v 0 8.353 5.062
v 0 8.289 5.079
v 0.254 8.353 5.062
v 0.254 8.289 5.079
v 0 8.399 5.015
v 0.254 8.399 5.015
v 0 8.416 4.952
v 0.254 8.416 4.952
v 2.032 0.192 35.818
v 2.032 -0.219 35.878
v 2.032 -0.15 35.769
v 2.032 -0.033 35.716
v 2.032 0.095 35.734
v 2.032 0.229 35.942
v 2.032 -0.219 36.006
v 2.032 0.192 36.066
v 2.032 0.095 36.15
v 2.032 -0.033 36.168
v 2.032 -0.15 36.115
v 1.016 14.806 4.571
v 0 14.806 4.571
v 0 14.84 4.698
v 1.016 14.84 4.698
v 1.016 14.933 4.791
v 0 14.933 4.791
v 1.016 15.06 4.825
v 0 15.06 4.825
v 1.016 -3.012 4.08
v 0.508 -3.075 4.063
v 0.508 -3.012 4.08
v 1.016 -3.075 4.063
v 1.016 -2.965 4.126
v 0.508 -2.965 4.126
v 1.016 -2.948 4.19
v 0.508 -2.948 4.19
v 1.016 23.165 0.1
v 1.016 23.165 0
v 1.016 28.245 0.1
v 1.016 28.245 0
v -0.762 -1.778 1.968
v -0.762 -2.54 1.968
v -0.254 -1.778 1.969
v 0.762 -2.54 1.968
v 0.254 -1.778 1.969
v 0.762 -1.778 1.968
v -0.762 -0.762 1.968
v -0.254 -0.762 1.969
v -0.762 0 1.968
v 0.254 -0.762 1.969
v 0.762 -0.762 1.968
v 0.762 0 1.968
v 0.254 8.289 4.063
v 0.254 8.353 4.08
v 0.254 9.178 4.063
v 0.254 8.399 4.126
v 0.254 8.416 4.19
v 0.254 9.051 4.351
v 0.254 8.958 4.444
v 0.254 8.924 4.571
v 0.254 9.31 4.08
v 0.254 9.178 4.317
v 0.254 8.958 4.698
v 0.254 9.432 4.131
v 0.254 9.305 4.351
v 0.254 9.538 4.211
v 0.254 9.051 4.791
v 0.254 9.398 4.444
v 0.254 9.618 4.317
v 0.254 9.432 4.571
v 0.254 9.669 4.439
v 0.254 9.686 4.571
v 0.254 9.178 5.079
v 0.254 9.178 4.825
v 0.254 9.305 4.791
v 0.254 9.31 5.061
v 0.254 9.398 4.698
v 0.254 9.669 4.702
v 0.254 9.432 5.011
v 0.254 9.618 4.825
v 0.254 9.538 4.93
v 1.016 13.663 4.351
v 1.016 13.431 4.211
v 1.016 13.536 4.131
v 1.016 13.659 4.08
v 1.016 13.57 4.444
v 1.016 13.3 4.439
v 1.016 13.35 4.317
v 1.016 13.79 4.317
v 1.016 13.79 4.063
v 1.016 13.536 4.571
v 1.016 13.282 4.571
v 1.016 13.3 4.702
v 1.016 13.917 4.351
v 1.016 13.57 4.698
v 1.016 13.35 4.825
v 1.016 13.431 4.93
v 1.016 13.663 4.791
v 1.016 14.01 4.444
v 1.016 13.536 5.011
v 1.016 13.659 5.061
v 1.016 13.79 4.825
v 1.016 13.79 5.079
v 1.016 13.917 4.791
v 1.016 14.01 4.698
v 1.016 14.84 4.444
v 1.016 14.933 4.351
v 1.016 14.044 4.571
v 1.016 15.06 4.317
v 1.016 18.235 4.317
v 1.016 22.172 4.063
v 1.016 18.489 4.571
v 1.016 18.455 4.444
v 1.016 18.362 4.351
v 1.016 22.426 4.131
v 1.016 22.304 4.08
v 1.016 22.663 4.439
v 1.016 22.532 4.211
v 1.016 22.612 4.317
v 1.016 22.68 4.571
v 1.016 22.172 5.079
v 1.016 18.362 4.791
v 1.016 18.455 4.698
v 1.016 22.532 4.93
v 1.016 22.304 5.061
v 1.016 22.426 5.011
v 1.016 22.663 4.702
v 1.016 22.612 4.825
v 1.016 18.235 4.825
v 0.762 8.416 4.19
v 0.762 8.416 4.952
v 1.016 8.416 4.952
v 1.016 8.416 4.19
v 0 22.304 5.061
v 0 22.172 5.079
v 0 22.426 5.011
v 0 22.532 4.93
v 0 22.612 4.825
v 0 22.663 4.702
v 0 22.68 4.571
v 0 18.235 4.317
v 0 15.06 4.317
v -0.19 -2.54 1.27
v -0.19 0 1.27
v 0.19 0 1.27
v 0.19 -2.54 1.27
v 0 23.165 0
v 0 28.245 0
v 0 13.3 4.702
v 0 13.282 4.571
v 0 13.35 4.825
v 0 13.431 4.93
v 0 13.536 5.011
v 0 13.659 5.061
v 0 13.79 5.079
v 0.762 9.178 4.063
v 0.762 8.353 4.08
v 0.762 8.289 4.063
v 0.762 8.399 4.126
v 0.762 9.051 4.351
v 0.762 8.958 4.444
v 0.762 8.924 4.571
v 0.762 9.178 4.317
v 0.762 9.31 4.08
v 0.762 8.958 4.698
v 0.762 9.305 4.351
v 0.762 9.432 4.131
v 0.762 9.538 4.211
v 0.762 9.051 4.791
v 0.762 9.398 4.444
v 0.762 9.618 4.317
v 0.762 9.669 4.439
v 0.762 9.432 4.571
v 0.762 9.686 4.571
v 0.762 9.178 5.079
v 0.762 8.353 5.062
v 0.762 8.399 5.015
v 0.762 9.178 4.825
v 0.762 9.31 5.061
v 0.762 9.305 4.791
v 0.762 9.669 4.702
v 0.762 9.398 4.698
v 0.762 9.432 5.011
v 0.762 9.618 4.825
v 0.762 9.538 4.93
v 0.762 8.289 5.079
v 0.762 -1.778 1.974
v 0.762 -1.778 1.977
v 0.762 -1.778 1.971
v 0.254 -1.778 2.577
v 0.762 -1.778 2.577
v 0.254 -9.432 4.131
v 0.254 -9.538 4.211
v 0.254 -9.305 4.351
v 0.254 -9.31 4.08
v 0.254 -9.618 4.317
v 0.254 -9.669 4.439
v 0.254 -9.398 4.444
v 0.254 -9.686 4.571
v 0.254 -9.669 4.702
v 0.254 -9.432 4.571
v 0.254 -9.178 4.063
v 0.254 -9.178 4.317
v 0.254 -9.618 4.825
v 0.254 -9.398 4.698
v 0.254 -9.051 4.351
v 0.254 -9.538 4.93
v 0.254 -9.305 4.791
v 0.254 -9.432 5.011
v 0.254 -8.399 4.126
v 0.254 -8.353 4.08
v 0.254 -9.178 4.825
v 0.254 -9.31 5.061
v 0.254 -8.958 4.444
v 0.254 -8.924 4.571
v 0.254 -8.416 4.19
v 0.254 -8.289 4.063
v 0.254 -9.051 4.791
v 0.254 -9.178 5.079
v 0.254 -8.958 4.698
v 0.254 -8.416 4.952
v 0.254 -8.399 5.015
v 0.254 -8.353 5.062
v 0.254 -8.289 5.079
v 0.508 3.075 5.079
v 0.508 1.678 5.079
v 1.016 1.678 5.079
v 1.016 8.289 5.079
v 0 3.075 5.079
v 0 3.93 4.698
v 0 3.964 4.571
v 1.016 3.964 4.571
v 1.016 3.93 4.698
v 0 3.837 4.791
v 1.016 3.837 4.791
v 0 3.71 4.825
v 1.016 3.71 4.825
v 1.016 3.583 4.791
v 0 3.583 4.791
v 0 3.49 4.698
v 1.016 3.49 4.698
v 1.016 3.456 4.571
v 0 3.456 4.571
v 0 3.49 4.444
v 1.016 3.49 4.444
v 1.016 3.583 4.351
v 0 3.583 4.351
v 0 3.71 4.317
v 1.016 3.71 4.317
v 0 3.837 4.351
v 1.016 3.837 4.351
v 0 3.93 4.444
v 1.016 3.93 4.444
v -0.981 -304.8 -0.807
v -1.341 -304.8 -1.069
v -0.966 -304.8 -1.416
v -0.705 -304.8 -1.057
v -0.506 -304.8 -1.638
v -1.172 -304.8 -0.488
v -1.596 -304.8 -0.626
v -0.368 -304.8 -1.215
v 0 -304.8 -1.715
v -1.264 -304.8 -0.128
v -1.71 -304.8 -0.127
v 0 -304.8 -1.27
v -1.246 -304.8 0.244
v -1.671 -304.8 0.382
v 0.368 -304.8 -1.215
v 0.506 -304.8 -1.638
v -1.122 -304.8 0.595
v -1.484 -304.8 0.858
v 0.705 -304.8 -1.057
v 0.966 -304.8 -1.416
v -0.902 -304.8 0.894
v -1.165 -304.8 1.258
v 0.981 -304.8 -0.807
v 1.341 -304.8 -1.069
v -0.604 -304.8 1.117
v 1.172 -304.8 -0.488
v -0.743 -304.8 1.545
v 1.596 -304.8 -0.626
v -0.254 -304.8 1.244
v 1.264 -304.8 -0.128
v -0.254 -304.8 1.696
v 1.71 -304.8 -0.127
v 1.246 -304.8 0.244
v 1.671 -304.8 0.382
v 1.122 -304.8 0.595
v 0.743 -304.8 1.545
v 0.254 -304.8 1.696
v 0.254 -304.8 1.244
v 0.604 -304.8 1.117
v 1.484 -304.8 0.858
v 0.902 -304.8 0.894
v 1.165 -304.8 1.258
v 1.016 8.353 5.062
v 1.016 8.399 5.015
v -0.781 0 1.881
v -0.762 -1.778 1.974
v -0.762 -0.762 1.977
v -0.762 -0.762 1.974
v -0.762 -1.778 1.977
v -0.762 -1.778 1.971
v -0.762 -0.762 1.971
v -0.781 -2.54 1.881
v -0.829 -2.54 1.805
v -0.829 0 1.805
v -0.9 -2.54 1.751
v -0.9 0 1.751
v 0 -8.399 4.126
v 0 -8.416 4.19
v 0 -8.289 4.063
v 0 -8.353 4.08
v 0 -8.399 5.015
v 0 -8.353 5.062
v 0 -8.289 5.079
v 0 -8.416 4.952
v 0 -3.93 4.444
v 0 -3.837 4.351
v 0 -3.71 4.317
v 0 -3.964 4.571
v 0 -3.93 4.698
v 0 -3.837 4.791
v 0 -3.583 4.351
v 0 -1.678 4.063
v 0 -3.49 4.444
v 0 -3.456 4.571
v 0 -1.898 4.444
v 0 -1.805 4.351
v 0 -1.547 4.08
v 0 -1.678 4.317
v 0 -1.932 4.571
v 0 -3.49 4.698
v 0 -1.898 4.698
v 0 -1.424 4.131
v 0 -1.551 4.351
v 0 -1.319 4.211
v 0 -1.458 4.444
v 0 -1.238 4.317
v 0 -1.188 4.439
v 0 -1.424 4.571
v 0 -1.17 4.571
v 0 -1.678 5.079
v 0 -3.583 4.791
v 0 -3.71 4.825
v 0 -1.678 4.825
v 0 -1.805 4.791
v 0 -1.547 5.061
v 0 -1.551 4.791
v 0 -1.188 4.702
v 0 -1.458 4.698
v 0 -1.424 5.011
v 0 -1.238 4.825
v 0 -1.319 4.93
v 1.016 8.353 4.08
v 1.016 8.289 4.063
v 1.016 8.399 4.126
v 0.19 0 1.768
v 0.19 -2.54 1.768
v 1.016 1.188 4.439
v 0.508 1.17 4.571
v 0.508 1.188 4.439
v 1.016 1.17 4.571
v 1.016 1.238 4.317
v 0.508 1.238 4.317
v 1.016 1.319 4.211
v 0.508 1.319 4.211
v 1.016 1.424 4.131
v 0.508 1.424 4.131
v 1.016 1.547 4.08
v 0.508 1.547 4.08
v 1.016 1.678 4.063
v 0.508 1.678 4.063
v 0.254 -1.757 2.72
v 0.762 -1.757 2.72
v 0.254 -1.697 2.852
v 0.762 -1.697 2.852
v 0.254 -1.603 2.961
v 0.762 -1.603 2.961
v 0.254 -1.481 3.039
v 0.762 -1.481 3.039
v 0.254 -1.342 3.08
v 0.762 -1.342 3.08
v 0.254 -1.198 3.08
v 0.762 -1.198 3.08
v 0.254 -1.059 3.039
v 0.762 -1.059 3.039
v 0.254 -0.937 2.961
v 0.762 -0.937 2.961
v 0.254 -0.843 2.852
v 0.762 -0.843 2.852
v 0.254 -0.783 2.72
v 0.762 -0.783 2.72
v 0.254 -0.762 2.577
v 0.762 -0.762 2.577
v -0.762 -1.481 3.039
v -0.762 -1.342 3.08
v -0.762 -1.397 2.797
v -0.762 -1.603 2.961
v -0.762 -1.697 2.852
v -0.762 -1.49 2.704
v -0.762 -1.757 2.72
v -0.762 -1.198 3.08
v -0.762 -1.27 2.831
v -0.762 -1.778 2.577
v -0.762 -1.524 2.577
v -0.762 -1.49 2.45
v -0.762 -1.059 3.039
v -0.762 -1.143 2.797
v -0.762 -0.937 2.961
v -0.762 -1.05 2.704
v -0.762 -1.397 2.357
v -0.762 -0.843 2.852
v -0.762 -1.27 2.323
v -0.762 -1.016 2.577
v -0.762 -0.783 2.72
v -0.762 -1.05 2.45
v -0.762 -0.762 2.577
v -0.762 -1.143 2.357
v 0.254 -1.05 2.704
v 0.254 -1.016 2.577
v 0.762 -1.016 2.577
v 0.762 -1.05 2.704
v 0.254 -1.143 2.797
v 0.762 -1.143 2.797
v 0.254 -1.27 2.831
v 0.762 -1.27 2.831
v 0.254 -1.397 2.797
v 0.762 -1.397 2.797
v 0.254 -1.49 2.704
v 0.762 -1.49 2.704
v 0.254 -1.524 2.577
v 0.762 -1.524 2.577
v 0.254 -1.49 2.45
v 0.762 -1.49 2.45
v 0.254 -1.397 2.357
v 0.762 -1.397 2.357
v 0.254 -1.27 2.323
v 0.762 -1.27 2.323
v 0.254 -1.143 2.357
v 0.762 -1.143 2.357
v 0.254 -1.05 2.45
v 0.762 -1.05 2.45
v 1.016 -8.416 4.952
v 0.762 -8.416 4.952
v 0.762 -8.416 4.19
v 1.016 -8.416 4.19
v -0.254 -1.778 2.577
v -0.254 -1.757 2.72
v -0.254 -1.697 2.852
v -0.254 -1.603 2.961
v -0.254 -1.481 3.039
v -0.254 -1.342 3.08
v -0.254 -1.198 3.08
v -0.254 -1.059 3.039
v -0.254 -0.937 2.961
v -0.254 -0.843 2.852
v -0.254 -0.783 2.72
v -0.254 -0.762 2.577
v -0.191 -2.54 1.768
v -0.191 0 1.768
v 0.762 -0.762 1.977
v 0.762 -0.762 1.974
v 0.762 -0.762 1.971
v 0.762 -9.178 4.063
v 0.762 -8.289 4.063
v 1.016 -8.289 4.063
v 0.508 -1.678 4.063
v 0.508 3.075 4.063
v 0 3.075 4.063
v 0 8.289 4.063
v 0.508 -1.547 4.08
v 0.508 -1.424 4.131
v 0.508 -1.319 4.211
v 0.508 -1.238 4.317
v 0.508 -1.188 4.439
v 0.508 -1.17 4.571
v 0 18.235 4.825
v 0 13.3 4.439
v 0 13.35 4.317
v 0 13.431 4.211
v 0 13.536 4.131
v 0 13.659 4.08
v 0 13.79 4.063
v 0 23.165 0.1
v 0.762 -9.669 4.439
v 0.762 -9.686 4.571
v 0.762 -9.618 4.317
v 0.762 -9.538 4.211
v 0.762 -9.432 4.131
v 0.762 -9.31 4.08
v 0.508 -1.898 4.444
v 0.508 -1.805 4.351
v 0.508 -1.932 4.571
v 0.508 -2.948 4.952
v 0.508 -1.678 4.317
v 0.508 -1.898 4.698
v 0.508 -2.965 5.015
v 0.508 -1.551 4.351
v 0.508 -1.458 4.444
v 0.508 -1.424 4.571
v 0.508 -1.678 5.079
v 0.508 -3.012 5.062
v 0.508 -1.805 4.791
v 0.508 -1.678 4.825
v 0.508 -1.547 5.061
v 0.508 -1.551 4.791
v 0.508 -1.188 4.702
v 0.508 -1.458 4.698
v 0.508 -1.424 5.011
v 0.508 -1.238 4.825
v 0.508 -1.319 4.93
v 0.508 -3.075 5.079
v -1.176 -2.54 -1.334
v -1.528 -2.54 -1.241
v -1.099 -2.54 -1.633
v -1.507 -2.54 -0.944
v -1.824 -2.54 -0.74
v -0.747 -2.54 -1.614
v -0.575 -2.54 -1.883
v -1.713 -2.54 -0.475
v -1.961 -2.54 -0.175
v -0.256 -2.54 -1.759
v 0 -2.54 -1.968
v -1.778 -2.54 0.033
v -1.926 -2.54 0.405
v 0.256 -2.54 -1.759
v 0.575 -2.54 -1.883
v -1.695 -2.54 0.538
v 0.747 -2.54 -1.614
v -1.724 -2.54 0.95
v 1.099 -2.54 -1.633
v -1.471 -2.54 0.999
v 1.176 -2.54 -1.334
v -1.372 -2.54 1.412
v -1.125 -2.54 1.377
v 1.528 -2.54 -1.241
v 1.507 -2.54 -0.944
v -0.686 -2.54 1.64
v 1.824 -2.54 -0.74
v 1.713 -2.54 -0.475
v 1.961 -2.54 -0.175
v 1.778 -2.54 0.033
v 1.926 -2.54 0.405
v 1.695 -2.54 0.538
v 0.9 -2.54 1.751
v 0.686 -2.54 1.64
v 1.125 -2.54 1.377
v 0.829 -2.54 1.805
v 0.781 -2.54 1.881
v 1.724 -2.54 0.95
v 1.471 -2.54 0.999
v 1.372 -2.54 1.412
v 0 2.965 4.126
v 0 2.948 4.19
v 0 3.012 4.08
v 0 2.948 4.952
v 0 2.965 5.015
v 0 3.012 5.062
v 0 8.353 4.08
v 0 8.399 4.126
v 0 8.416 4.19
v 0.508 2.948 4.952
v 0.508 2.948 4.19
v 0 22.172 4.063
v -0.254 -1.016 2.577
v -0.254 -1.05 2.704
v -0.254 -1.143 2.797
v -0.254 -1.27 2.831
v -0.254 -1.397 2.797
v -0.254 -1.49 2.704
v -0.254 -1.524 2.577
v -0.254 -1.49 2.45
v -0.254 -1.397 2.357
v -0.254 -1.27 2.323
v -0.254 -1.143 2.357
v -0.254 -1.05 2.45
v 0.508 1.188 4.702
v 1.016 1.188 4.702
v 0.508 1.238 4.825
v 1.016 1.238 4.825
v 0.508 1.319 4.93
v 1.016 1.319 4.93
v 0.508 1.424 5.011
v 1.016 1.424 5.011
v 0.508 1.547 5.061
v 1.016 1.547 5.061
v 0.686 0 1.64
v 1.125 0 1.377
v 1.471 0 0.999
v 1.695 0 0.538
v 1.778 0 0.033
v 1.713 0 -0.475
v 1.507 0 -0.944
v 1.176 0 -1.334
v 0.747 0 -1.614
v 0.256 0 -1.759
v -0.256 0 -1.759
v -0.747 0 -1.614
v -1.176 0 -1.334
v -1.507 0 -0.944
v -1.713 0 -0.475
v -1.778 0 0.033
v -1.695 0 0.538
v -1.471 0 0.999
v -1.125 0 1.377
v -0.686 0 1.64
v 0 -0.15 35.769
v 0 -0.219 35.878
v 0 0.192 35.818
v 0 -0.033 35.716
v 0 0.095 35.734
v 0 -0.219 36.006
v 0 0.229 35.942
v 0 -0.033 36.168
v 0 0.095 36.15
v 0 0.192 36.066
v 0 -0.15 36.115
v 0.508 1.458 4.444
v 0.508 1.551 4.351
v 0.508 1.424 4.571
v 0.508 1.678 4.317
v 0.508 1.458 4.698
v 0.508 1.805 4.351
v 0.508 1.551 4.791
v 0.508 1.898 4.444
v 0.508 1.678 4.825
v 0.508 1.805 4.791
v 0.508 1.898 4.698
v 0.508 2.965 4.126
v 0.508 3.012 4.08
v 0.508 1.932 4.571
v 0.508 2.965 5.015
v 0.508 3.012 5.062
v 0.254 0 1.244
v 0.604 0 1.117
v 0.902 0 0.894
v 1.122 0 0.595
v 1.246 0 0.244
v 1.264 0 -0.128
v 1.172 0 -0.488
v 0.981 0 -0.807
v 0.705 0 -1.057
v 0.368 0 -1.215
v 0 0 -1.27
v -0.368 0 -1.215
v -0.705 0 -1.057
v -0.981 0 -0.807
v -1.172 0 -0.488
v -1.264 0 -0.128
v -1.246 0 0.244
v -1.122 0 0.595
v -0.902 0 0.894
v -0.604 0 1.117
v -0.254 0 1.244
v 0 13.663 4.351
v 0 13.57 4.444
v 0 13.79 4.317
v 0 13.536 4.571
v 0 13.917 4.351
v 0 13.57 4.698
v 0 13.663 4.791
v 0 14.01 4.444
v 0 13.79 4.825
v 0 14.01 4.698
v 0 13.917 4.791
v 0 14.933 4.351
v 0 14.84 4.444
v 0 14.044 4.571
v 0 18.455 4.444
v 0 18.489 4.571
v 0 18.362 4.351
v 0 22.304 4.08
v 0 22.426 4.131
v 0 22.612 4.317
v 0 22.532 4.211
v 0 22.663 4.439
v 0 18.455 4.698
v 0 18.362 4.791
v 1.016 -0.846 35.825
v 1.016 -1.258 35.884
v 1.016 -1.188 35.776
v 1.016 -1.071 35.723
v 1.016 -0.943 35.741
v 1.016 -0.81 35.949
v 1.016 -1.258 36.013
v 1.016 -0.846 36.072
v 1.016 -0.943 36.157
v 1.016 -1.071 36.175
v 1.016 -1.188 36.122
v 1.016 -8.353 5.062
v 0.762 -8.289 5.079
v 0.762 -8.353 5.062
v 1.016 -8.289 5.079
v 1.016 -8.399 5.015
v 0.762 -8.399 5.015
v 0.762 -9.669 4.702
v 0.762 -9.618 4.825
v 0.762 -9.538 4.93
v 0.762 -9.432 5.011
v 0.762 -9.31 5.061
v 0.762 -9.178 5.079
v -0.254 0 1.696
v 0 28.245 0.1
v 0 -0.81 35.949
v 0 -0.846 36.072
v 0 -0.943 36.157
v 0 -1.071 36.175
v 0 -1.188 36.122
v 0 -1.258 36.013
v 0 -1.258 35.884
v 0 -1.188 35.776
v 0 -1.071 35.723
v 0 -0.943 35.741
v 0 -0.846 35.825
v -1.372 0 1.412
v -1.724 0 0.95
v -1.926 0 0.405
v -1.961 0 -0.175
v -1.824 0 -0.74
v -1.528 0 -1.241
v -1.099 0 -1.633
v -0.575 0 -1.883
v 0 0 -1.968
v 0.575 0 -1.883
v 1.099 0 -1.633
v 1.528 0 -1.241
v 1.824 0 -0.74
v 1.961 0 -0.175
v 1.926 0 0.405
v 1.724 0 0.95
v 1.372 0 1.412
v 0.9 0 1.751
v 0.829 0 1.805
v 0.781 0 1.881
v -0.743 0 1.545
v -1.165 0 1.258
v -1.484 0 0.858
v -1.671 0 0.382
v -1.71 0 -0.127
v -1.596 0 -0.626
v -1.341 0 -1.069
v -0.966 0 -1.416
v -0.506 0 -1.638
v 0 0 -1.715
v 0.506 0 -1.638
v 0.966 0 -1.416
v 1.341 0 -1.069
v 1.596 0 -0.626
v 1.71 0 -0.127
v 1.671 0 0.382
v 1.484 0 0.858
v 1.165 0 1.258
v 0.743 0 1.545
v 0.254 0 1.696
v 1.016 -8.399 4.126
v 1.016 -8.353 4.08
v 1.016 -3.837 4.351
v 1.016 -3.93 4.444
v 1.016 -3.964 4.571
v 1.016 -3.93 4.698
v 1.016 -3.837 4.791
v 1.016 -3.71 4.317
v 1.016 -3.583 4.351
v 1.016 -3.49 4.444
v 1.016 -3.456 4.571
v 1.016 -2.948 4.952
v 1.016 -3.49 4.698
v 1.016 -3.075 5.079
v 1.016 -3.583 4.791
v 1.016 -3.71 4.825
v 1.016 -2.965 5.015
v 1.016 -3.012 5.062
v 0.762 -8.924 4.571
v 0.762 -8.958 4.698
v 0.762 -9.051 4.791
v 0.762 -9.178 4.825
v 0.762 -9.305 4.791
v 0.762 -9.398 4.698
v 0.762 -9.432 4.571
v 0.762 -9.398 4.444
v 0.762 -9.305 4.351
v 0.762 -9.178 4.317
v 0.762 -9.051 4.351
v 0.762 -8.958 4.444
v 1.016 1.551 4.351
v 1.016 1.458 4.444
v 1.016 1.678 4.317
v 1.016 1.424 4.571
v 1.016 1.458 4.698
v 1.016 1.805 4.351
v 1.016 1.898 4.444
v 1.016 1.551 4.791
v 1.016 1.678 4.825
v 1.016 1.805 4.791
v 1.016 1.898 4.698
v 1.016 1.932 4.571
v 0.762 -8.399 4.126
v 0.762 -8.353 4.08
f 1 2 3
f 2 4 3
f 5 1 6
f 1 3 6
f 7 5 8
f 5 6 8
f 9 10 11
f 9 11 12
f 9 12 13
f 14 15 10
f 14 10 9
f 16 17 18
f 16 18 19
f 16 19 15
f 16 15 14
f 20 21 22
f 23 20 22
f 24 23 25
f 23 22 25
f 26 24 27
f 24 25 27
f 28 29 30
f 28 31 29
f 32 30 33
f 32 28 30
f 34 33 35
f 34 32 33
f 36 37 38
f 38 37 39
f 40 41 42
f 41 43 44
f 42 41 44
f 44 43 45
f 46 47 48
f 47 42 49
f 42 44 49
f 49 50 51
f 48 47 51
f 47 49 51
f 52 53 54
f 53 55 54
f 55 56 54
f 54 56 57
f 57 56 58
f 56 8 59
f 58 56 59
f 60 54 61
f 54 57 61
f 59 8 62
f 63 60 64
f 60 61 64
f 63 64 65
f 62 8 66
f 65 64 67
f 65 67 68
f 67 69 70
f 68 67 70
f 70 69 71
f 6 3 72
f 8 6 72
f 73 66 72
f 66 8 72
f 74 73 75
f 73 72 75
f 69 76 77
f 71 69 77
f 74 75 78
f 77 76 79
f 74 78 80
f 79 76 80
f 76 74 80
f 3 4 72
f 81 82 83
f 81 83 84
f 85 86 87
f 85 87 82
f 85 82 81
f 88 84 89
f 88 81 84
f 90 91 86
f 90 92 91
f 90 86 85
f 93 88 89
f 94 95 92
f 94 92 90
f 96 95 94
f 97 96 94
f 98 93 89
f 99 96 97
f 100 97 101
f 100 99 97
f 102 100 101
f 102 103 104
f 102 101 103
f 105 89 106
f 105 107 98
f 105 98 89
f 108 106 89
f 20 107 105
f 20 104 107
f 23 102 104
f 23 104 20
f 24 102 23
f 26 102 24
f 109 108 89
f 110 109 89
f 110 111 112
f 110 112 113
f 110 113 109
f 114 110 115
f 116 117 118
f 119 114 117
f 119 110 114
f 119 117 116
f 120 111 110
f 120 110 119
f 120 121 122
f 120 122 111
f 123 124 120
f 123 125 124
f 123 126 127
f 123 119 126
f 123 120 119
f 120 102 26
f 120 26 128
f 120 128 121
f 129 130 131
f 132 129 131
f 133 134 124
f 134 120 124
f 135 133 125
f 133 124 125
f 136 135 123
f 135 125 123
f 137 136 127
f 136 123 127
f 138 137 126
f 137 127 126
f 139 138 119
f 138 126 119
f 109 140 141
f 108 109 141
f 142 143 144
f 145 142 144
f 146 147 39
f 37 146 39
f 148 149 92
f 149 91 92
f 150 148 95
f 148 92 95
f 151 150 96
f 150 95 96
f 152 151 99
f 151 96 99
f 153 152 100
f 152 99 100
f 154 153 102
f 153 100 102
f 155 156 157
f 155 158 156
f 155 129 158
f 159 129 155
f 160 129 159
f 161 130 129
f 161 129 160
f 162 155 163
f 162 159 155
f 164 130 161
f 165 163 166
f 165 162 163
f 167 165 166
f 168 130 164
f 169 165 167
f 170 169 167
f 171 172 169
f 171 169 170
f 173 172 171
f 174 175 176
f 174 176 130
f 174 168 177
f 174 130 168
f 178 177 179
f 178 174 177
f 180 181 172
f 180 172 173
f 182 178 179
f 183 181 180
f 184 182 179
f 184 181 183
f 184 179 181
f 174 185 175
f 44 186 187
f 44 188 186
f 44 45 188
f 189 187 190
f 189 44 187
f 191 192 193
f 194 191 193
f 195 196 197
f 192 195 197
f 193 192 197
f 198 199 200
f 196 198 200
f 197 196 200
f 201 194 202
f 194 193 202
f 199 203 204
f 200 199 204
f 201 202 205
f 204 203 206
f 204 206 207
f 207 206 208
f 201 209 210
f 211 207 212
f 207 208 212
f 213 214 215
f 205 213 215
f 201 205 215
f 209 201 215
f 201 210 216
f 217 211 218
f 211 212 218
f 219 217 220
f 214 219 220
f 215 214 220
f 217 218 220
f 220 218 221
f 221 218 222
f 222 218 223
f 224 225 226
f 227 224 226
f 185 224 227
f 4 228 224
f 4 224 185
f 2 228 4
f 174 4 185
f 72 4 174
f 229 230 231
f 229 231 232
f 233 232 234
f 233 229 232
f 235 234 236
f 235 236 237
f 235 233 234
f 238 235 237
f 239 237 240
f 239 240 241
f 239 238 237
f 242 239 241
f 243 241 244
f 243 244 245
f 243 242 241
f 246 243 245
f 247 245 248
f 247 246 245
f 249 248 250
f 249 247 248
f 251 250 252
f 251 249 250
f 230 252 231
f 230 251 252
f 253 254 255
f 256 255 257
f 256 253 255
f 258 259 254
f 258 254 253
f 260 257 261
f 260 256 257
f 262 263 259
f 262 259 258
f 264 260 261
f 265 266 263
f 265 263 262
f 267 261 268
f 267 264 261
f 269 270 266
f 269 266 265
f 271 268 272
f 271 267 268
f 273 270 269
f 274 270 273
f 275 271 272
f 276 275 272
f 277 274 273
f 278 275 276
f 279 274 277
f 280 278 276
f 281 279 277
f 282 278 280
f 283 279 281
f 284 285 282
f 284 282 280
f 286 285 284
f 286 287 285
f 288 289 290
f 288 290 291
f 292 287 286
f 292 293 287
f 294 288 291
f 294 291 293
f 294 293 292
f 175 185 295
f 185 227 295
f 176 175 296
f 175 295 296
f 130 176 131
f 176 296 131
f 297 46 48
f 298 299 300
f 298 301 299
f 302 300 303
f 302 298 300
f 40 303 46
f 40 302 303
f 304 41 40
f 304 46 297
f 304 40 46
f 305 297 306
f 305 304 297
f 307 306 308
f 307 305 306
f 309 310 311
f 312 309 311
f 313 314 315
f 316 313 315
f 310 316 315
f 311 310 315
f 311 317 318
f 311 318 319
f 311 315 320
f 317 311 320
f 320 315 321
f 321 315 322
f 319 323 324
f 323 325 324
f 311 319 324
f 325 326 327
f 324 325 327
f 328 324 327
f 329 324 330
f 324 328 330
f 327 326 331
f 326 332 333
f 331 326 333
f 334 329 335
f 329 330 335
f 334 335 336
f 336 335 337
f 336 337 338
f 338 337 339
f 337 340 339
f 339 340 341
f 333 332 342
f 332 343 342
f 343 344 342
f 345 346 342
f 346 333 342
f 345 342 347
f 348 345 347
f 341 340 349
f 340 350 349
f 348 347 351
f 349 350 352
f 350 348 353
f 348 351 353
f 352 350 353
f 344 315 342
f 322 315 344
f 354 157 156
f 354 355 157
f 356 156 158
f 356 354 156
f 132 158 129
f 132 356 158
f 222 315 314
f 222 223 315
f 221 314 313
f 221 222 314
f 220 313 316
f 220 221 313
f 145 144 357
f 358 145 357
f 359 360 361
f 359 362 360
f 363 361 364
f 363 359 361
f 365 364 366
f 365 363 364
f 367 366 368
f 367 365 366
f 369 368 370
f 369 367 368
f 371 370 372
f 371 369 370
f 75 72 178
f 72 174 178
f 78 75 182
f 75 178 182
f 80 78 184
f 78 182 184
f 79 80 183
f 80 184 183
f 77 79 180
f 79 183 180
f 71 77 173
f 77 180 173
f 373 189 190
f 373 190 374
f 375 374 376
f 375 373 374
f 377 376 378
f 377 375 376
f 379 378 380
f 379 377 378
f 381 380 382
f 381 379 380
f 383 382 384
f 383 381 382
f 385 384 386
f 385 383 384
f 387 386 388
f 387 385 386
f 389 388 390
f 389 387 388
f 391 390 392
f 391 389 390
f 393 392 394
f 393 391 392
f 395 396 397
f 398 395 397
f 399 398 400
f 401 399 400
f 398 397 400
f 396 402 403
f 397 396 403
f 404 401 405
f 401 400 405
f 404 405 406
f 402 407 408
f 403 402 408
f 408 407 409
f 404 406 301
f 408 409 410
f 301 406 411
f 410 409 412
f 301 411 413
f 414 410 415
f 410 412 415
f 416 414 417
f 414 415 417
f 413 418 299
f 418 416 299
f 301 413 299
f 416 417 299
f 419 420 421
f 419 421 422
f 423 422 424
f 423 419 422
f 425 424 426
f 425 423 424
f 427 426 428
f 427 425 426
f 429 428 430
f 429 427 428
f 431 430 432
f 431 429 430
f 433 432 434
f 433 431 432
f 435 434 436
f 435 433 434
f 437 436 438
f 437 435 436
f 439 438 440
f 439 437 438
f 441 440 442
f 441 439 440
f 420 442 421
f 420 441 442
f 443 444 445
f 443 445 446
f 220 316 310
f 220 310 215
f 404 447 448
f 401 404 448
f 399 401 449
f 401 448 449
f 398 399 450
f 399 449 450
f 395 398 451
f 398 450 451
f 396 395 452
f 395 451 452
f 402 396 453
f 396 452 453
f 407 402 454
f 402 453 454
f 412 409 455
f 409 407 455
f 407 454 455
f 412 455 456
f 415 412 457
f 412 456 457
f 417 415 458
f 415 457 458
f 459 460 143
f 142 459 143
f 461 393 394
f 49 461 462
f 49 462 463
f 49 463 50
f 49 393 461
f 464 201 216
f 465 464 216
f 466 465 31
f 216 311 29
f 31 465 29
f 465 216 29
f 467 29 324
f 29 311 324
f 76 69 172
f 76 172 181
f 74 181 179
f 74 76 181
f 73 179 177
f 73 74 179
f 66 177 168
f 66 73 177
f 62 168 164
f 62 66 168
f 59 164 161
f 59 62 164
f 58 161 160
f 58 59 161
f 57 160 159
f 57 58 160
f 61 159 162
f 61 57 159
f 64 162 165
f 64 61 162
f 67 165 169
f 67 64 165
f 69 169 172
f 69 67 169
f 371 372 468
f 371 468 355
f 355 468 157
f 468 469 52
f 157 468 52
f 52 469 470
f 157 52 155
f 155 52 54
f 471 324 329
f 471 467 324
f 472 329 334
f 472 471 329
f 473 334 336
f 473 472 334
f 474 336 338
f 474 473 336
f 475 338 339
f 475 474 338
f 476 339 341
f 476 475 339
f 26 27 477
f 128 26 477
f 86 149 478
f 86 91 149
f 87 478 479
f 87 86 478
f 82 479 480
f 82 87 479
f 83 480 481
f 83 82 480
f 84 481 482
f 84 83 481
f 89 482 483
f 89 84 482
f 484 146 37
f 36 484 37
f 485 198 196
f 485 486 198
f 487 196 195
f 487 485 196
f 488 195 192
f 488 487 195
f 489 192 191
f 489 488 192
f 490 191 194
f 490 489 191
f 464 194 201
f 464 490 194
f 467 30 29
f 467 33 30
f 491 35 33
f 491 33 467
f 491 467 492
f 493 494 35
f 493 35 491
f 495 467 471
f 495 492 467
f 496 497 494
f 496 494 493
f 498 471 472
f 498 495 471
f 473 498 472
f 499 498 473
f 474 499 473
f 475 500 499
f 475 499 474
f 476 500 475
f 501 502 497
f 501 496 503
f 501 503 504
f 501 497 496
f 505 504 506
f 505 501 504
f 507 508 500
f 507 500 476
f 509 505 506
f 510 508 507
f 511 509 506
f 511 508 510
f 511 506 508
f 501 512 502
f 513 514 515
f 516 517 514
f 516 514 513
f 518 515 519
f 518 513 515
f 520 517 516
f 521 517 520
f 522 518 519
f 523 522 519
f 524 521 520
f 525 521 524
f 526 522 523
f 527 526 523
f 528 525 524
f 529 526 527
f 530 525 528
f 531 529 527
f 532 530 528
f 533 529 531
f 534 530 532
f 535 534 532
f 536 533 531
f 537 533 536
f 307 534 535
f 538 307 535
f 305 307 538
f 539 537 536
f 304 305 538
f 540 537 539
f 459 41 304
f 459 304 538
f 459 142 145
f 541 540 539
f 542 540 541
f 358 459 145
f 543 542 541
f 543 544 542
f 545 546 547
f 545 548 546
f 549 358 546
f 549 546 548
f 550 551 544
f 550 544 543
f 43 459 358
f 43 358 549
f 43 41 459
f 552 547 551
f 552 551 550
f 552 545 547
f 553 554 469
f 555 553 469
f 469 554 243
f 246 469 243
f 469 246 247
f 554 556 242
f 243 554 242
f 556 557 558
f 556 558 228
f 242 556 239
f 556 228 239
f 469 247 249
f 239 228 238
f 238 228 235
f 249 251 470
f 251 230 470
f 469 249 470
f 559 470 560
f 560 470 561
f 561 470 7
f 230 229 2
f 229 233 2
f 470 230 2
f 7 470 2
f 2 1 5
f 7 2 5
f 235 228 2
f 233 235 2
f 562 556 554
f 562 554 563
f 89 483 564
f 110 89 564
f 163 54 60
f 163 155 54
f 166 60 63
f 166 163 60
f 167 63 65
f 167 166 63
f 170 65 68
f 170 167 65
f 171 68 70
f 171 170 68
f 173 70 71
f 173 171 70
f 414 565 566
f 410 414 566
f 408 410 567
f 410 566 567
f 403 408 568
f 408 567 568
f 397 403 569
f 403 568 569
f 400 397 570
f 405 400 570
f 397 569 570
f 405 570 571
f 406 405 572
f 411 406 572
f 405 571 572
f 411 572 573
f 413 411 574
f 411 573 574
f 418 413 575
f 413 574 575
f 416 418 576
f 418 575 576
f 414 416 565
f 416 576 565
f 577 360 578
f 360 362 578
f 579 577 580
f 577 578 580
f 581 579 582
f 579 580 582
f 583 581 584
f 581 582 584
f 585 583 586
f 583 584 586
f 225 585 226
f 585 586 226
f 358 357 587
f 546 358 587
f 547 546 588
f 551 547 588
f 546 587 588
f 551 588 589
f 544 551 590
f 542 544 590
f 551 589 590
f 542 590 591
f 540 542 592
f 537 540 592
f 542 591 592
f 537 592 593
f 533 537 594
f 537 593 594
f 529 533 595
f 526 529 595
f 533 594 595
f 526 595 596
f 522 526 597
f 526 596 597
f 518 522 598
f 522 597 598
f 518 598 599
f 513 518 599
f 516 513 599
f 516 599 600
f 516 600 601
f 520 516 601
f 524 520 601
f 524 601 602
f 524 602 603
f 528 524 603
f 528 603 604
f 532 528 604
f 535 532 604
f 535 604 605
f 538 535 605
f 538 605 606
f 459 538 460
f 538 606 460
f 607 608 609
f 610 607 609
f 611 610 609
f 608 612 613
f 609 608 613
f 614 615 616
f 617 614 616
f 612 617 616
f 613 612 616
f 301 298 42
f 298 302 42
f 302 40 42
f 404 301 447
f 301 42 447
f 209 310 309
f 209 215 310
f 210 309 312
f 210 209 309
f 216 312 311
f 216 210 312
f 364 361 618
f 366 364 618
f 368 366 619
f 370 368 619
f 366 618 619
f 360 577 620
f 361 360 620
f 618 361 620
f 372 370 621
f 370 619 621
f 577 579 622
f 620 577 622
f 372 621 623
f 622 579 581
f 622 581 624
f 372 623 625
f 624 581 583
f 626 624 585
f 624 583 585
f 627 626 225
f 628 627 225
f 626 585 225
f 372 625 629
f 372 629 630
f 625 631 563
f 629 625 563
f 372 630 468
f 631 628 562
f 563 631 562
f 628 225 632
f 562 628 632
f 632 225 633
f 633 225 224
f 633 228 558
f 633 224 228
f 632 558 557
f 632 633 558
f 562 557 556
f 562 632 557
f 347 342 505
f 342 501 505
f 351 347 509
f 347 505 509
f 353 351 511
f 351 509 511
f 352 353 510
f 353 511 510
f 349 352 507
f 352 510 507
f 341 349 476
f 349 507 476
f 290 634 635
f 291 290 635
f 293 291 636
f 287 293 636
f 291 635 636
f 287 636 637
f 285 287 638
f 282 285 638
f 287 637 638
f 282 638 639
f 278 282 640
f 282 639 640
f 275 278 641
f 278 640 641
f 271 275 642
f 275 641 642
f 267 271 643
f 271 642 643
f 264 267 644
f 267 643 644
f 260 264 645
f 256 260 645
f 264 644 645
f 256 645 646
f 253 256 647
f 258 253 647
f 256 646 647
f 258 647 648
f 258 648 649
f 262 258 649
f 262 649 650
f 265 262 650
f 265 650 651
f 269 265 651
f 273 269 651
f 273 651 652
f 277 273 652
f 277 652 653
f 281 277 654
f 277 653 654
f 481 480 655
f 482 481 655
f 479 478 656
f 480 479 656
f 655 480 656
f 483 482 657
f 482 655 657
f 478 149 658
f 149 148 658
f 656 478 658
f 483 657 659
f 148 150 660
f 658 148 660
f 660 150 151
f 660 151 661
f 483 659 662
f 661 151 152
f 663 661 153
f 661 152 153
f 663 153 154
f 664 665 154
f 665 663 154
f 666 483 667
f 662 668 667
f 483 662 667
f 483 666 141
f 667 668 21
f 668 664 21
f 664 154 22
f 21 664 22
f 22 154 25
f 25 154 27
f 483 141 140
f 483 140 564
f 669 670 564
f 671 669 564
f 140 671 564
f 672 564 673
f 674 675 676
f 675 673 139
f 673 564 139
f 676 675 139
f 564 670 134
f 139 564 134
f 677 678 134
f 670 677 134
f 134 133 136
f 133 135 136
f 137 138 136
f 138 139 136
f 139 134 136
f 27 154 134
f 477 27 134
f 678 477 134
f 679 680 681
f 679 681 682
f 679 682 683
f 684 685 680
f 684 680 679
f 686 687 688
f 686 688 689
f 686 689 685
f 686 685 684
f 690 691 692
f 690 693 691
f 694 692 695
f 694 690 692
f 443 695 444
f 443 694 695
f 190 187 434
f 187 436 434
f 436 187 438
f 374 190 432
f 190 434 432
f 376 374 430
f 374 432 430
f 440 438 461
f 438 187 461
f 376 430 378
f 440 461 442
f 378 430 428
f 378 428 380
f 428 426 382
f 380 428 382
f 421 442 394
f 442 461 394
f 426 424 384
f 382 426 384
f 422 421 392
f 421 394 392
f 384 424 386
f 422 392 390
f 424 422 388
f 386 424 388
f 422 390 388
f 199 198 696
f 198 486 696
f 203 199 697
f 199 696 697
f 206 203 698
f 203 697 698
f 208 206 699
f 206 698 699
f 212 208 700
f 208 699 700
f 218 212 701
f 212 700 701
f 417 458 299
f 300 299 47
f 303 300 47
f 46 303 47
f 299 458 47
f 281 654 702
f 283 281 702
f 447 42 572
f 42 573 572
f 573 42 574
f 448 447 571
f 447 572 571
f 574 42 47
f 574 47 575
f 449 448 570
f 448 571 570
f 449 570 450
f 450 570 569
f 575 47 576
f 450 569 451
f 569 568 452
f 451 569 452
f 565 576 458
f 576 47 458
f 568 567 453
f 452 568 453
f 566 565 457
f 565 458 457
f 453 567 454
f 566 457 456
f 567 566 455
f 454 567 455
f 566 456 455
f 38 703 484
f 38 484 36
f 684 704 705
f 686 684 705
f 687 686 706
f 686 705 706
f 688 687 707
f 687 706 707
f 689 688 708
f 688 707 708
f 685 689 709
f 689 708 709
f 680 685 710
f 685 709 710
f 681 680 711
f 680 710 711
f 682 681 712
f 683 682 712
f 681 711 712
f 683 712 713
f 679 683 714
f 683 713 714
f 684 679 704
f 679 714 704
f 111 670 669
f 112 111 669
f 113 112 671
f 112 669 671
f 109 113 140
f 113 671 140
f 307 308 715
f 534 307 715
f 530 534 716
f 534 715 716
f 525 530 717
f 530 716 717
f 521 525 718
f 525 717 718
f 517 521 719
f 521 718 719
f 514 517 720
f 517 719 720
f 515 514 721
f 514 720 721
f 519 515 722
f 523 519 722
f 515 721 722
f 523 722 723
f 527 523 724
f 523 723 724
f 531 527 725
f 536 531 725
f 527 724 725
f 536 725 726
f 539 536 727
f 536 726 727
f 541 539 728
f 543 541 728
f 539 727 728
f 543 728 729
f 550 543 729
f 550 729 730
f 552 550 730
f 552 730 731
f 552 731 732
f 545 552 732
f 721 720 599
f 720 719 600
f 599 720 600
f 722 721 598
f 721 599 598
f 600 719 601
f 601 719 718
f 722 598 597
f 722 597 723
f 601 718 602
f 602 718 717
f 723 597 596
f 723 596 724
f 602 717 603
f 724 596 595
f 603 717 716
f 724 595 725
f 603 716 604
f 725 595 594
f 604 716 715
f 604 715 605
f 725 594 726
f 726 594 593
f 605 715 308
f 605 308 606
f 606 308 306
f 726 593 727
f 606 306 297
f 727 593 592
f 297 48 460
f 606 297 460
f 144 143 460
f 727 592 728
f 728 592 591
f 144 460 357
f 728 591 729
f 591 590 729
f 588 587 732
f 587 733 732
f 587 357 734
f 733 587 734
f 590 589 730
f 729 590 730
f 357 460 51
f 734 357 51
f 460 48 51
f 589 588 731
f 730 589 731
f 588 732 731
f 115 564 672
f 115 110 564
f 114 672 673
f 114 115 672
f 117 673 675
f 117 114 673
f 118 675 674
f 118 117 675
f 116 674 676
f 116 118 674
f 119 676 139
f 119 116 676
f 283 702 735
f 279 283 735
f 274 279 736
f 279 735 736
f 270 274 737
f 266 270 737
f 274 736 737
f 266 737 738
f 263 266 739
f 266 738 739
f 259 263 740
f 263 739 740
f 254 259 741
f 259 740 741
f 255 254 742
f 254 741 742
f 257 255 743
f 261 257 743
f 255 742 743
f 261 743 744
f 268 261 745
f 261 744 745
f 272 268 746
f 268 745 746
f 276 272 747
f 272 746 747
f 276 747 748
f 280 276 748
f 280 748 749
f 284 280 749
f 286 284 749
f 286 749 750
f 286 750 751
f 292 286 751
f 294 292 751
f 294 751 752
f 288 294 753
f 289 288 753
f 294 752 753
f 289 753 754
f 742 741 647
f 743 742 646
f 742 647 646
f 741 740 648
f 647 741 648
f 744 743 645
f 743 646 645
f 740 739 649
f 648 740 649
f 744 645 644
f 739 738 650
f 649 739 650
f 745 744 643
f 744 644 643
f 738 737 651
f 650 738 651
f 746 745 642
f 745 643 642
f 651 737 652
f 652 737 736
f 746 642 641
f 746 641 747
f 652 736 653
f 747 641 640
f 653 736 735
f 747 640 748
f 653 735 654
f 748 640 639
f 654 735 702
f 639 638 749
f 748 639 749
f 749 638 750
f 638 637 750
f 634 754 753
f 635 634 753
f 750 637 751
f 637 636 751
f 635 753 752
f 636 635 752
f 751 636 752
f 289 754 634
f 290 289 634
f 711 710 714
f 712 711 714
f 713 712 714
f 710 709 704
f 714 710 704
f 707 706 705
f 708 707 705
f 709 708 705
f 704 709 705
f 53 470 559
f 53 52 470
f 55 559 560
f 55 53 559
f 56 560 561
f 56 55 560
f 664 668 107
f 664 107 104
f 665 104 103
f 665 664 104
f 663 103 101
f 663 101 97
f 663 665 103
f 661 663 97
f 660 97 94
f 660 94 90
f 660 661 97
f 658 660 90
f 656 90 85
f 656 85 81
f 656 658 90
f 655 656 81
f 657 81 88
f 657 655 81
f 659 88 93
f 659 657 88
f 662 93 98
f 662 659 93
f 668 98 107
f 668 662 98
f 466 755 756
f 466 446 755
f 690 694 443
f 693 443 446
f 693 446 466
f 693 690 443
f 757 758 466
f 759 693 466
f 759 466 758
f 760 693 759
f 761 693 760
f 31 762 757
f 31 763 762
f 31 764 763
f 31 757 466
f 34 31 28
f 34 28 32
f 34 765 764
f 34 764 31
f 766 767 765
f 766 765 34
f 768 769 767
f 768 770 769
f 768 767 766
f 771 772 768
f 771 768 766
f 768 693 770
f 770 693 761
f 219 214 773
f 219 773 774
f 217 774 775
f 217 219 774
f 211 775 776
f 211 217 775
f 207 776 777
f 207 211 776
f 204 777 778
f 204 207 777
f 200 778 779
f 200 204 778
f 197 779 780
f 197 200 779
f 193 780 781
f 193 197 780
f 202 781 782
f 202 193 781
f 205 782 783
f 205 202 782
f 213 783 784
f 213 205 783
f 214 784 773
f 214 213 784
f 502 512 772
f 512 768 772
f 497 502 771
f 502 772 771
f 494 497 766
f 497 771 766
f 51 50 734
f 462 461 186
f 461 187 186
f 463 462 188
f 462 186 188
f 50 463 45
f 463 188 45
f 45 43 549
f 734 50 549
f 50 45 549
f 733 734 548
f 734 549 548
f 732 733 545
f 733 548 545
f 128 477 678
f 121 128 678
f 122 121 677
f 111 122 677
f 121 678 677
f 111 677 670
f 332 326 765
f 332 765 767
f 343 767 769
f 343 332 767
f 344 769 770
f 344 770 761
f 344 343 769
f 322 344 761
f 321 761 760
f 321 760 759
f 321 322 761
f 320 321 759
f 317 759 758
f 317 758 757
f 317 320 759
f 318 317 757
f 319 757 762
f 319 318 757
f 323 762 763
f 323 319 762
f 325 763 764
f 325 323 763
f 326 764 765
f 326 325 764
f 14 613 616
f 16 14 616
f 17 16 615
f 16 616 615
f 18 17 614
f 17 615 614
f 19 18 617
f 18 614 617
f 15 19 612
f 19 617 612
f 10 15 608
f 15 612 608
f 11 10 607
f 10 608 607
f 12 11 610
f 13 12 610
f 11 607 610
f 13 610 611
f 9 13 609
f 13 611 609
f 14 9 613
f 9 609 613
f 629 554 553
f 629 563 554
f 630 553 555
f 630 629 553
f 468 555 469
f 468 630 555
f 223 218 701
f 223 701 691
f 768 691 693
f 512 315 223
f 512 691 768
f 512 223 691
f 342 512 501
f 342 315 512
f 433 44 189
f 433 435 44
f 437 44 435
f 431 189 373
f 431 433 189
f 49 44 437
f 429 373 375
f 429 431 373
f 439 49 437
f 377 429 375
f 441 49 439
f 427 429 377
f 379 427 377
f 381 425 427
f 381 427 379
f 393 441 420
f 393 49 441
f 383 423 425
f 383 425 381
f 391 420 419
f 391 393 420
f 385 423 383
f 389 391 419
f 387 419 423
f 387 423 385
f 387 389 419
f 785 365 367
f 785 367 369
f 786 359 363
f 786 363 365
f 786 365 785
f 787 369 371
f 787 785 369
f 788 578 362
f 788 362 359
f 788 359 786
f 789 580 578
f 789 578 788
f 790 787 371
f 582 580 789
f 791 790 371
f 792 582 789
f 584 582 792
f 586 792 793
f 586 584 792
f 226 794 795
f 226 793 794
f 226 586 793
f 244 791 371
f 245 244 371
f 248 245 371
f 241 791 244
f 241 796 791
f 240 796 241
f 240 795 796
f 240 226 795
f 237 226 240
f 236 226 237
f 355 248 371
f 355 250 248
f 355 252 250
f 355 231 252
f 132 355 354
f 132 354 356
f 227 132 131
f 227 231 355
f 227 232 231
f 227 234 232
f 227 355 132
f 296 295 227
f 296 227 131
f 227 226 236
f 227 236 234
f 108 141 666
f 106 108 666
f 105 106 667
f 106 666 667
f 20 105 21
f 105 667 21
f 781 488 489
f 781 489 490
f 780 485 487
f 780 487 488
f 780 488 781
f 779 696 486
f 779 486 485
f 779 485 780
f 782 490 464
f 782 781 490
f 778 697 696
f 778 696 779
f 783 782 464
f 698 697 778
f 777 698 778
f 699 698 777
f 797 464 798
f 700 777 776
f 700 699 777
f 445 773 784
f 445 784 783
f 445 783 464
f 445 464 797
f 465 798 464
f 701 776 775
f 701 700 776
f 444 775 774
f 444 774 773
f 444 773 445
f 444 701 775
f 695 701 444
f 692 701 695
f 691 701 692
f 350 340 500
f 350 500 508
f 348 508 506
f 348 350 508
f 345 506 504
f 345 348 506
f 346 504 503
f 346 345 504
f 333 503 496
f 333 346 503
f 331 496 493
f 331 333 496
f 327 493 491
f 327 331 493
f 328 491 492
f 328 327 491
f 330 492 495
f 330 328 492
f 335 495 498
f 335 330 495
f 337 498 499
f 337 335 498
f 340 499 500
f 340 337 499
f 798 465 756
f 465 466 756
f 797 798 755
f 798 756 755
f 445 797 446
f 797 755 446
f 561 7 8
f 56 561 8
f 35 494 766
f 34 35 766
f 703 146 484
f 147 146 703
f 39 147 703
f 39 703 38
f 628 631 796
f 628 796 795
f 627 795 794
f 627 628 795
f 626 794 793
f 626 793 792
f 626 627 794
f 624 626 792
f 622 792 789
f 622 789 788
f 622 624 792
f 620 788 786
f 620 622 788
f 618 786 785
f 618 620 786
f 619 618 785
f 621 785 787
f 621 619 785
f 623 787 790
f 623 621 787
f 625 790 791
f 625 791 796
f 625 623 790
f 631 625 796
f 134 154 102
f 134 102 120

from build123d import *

# Parameters (mm, degrees)
F0_W           = 8.516
F0_H           = 1.016
F0_R           = 0.254
F1_DEPTH       = 1.016
F0_W_2         = 9.398
F2_W           = 0.254
F2_H           = 1.27
F2_W_2         = 0.508
F2_H_2         = 1.778
F3_DEPTH       = 1.017
F4_R           = 0.50799
F4_2_R         = 0.50799
F4_3_R         = 0.50799
F5_R           = 0.127
F5_2_R         = 0.127
F7_DEPTH       = 304.8
F9_DEPTH       = 2.54
F10_W          = 0.508
F10_H          = 1.524
F11_DEPTH      = 304.801
F12_R          = 0.254
F13_DEPTH      = 1.9695
F13_DEPTH_BACK = 1.9695
F14_R          = 0.254
F15_R          = 0.2286
F16_DEPTH      = 2.032
F17_R          = 0.2286
F18_DEPTH      = 1.016
F19_W          = 1.016
F19_H          = 5.08
F20_DEPTH      = 0.1


# Not quite as in the source:
# - a fillet or chamfer is up to 0.001 mm smaller than in the source, because OpenCascade refuses the exact size


with BuildPart() as f1:
    # F0 (on Right) → F1 (new body)
    with BuildSketch(Plane.YZ):
        with Locations((-5.428305112, 4.5706343557)):
            Rectangle(F0_W, F0_H)
        with Locations((-9.178305112, 4.5706343557)):
            Circle(F0_R, mode=Mode.SUBTRACT)
        with Locations((-3.710305112, 4.5706343557)):
            Circle(F0_R, mode=Mode.SUBTRACT)
        with Locations((-1.678305112, 4.5706343557)):
            Circle(F0_R, mode=Mode.SUBTRACT)
    extrude(amount=F1_DEPTH)


with BuildPart() as f1b:
    # F0 (on Right) → F1, piece 2 (new body)
    with BuildSketch(Plane.YZ):
        with Locations((5.428305112, 4.5706343557)):
            Rectangle(F0_W, F0_H)
        with Locations((1.678305112, 4.5706343557)):
            Circle(F0_R, mode=Mode.SUBTRACT)
        with Locations((3.710305112, 4.5706343557)):
            Circle(F0_R, mode=Mode.SUBTRACT)
        with Locations((9.178305112, 4.5706343557)):
            Circle(F0_R, mode=Mode.SUBTRACT)
    extrude(amount=F1_DEPTH)


with BuildPart() as f1c:
    # F0 (on Right) → F1, piece 3 (new body)
    with BuildSketch(Plane.YZ):
        with Locations((17.9813661472, 4.5706343557)):
            Rectangle(F0_W_2, F0_H)
        with Locations((13.7903661472, 4.5706343557)):
            Circle(F0_R, mode=Mode.SUBTRACT)
        with BuildLine():
            ThreePointArc((14.8063661472, 4.5706343557), (14.8807610248, 4.7502394781), (15.0603661472, 4.8246343557))
            Line((15.0603661472, 4.8246343557), (18.2353661472, 4.8246343557))
            ThreePointArc((18.2353661472, 4.8246343557), (18.4149712697, 4.7502394781), (18.4893661472, 4.5706343557))
            ThreePointArc((18.4893661472, 4.5706343557), (18.4149712697, 4.3910292332), (18.2353661472, 4.3166343557))
            Line((18.2353661472, 4.3166343557), (15.0603661472, 4.3166343557))
            ThreePointArc((15.0603661472, 4.3166343557), (14.8807610248, 4.3910292332), (14.8063661472, 4.5706343557))
        make_face(mode=Mode.SUBTRACT)
    extrude(amount=F1_DEPTH)

    # F4#3 (radius 0.508 in the source; OpenCascade refuses exactly that, so slightly less here)
    f4_3_edges = [f1c.edges().sort_by_distance(p)[0] for p in [
        (0.508, 13.282366, 5.078634),
        (0.508, 13.282366, 4.062634),
        (0.508, 22.680366, 5.078634),
        (0.508, 22.680366, 4.062634),
    ]]
    fillet(f4_3_edges, radius=F4_3_R)


with BuildPart() as f3_tool:
    # F2 (on face) → F3 (new body, through all)
    with BuildSketch(Plane.XY.offset(5.0786343557)):
        with Locations((0.127, -9.051305112)):
            Rectangle(F2_W, F2_H)
        with Locations((0.889, -9.051305112)):
            Rectangle(F2_W, F2_H)
        with Locations((0.762, -2.059305112)):
            Rectangle(F2_W_2, F2_H_2)
        with Locations((0.254, 2.059305112)):
            Rectangle(F2_W_2, F2_H_2)
        with Locations((0.127, 9.051305112)):
            Rectangle(F2_W, F2_H)
        with Locations((0.889, 9.051305112)):
            Rectangle(F2_W, F2_H)
    extrude(amount=-F3_DEPTH)


with BuildPart() as f1_1:
    add(f1.part)

    # F3: cut by f3_tool
    add(f3_tool.part, mode=Mode.SUBTRACT)

    # F4 (radius 0.508 in the source; OpenCascade refuses exactly that, so slightly less here)
    f4_edges = [f1_1.edges().sort_by_distance(p)[0] for p in [
        (0.508, -9.686305, 5.078634),
        (0.508, -9.686305, 4.062634),
        (0.254, -1.170305, 5.078634),
        (0.254, -1.170305, 4.062634),
    ]]
    fillet(f4_edges, radius=F4_R)

    # F5
    f5_edges = [f1_1.edges().sort_by_distance(p)[0] for p in [
        (0.762, -2.948305, 5.078634),
        (0.762, -2.948305, 4.062634),
        (0.127, -8.416305, 4.062634),
        (0.127, -8.416305, 5.078634),
        (0.889, -8.416305, 5.078634),
        (0.889, -8.416305, 4.062634),
    ]]
    fillet(f5_edges, radius=F5_R)


with BuildPart() as f1b_1:
    add(f1b.part)

    # F3: cut by f3_tool
    add(f3_tool.part, mode=Mode.SUBTRACT)

    # F4#2 (radius 0.508 in the source; OpenCascade refuses exactly that, so slightly less here)
    f4_2_edges = [f1b_1.edges().sort_by_distance(p)[0] for p in [
        (0.762, 1.170305, 5.078634),
        (0.762, 1.170305, 4.062634),
        (0.508, 9.686305, 5.078634),
        (0.508, 9.686305, 4.062634),
    ]]
    fillet(f4_2_edges, radius=F4_2_R)

    # F5#2
    f5_2_edges = [f1b_1.edges().sort_by_distance(p)[0] for p in [
        (0.254, 2.948305, 5.078634),
        (0.254, 2.948305, 4.062634),
        (0.127, 8.416305, 5.078634),
        (0.127, 8.416305, 4.062634),
        (0.889, 8.416305, 5.078634),
        (0.889, 8.416305, 4.062634),
    ]]
    fillet(f5_2_edges, radius=F5_2_R)


with BuildPart() as f7:
    # F6 (on Front) → F7 (new body)
    with BuildSketch(Plane.XZ):
        with BuildLine():
            Line((-0.254, 1.2443407893), (-0.254, 1.6955808002))
            ThreePointArc((-0.254, 1.6955808002), (0, -1.7145), (0.254, 1.6955808002))
            Line((0.254, 1.6955808002), (0.254, 1.2443407893))
            ThreePointArc((0.254, 1.2443407893), (0, -1.27), (-0.254, 1.2443407893))
        make_face()
    extrude(amount=F7_DEPTH)


with BuildPart() as f9:
    # F8 (on Front) → F9 (new body)
    with BuildSketch(Plane.XZ):
        with BuildLine():
            Line((-0.762, 3.3390339529), (-0.762, 1.8150339529))
            ThreePointArc((-0.762, 1.8150339529), (0, -1.9685), (0.762, 1.8150339529))
            Line((0.762, 1.8150339529), (0.762, 3.3390339529))
            Line((0.762, 3.3390339529), (0, 3.3390339529))
            Line((0, 3.3390339529), (-0.762, 3.3390339529))
        make_face()
        with BuildLine():
            ThreePointArc((0.1905, 1.7677651852), (0, -1.778), (-0.1905, 1.7677651852))
            Line((-0.1905, 1.7677651852), (-0.1905, 1.27))
            Line((-0.1905, 1.27), (0.1905, 1.27))
            Line((0.1905, 1.27), (0.1905, 1.7677651852))
        make_face(mode=Mode.SUBTRACT)
    extrude(amount=F9_DEPTH)

    # F10 (on Front) → F11 (cut, through all)
    with BuildSketch(Plane.XZ):
        with Locations((0, 2.7305)):
            Rectangle(F10_W, F10_H)
    extrude(amount=F11_DEPTH, mode=Mode.SUBTRACT)

    # F12 (on Right) → F13 (cut, two sides)
    with BuildSketch(Plane.YZ) as f13_sk:
        with Locations((-1.27, 2.5770339529)):
            Circle(F12_R)
        with BuildLine():
            Line((0, 1.9685), (0, 3.3390339529))
            Line((0, 3.3390339529), (-0.6516448254, 3.5353413116))
            Line((-0.6516448254, 3.5353413116), (-2.2018356164, 3.5353413116))
            Line((-2.2018356164, 3.5353413116), (-2.54, 3.3390339529))
            Line((-2.54, 3.3390339529), (-2.54, 1.9685))
            Line((-2.54, 1.9685), (-1.778, 1.9685))
            Line((-1.778, 1.9685), (-1.778, 2.5770339529))
            ThreePointArc((-1.778, 2.5770339529), (-1.27, 3.0850339529), (-0.762, 2.5770339529))
            Line((-0.762, 2.5770339529), (-0.762, 1.9685))
            Line((-0.762, 1.9685), (0, 1.9685))
        make_face()
    extrude(amount=-F13_DEPTH, mode=Mode.SUBTRACT)
    extrude(f13_sk.sketch, amount=F13_DEPTH_BACK, mode=Mode.SUBTRACT)

    # F14 (call 1 of 2: OpenCascade refuses the feature's edges together)
    f14_edges = [f9.edges().sort_by_distance(p)[0] for p in [
        (0.762, -1.27, 1.815034),
    ]]
    fillet(f14_edges, radius=F14_R)

    # F14#2 (call 2 of 2)
    f14_2_edges = [f9.edges().sort_by_distance(p)[0] for p in [
        (-0.762, -1.27, 1.815034),
    ]]
    fillet(f14_2_edges, radius=F14_R)


with BuildPart() as f16:
    # F15 (on Right) → F16 (new body)
    with BuildSketch(Plane.YZ):
        with Locations((0, 35.941991955)):
            Circle(F15_R)
    extrude(amount=F16_DEPTH)


with BuildPart() as f18:
    # F17 (on Right) → F18 (new body)
    with BuildSketch(Plane.YZ):
        with Locations((-1.0384203633, 35.9487757087)):
            Circle(F17_R)
    extrude(amount=F18_DEPTH)


with BuildPart() as f20:
    # F19 (on Top) → F20 (new body)
    with BuildSketch(Plane.XY):
        with Locations((0.508, 25.7052464718)):
            Rectangle(F19_W, F19_H)
    extrude(amount=F20_DEPTH)


solid = Compound([f1c.part, f1_1.part, f1b_1.part, f7.part, f9.part, f16.part, f18.part, f20.part])
